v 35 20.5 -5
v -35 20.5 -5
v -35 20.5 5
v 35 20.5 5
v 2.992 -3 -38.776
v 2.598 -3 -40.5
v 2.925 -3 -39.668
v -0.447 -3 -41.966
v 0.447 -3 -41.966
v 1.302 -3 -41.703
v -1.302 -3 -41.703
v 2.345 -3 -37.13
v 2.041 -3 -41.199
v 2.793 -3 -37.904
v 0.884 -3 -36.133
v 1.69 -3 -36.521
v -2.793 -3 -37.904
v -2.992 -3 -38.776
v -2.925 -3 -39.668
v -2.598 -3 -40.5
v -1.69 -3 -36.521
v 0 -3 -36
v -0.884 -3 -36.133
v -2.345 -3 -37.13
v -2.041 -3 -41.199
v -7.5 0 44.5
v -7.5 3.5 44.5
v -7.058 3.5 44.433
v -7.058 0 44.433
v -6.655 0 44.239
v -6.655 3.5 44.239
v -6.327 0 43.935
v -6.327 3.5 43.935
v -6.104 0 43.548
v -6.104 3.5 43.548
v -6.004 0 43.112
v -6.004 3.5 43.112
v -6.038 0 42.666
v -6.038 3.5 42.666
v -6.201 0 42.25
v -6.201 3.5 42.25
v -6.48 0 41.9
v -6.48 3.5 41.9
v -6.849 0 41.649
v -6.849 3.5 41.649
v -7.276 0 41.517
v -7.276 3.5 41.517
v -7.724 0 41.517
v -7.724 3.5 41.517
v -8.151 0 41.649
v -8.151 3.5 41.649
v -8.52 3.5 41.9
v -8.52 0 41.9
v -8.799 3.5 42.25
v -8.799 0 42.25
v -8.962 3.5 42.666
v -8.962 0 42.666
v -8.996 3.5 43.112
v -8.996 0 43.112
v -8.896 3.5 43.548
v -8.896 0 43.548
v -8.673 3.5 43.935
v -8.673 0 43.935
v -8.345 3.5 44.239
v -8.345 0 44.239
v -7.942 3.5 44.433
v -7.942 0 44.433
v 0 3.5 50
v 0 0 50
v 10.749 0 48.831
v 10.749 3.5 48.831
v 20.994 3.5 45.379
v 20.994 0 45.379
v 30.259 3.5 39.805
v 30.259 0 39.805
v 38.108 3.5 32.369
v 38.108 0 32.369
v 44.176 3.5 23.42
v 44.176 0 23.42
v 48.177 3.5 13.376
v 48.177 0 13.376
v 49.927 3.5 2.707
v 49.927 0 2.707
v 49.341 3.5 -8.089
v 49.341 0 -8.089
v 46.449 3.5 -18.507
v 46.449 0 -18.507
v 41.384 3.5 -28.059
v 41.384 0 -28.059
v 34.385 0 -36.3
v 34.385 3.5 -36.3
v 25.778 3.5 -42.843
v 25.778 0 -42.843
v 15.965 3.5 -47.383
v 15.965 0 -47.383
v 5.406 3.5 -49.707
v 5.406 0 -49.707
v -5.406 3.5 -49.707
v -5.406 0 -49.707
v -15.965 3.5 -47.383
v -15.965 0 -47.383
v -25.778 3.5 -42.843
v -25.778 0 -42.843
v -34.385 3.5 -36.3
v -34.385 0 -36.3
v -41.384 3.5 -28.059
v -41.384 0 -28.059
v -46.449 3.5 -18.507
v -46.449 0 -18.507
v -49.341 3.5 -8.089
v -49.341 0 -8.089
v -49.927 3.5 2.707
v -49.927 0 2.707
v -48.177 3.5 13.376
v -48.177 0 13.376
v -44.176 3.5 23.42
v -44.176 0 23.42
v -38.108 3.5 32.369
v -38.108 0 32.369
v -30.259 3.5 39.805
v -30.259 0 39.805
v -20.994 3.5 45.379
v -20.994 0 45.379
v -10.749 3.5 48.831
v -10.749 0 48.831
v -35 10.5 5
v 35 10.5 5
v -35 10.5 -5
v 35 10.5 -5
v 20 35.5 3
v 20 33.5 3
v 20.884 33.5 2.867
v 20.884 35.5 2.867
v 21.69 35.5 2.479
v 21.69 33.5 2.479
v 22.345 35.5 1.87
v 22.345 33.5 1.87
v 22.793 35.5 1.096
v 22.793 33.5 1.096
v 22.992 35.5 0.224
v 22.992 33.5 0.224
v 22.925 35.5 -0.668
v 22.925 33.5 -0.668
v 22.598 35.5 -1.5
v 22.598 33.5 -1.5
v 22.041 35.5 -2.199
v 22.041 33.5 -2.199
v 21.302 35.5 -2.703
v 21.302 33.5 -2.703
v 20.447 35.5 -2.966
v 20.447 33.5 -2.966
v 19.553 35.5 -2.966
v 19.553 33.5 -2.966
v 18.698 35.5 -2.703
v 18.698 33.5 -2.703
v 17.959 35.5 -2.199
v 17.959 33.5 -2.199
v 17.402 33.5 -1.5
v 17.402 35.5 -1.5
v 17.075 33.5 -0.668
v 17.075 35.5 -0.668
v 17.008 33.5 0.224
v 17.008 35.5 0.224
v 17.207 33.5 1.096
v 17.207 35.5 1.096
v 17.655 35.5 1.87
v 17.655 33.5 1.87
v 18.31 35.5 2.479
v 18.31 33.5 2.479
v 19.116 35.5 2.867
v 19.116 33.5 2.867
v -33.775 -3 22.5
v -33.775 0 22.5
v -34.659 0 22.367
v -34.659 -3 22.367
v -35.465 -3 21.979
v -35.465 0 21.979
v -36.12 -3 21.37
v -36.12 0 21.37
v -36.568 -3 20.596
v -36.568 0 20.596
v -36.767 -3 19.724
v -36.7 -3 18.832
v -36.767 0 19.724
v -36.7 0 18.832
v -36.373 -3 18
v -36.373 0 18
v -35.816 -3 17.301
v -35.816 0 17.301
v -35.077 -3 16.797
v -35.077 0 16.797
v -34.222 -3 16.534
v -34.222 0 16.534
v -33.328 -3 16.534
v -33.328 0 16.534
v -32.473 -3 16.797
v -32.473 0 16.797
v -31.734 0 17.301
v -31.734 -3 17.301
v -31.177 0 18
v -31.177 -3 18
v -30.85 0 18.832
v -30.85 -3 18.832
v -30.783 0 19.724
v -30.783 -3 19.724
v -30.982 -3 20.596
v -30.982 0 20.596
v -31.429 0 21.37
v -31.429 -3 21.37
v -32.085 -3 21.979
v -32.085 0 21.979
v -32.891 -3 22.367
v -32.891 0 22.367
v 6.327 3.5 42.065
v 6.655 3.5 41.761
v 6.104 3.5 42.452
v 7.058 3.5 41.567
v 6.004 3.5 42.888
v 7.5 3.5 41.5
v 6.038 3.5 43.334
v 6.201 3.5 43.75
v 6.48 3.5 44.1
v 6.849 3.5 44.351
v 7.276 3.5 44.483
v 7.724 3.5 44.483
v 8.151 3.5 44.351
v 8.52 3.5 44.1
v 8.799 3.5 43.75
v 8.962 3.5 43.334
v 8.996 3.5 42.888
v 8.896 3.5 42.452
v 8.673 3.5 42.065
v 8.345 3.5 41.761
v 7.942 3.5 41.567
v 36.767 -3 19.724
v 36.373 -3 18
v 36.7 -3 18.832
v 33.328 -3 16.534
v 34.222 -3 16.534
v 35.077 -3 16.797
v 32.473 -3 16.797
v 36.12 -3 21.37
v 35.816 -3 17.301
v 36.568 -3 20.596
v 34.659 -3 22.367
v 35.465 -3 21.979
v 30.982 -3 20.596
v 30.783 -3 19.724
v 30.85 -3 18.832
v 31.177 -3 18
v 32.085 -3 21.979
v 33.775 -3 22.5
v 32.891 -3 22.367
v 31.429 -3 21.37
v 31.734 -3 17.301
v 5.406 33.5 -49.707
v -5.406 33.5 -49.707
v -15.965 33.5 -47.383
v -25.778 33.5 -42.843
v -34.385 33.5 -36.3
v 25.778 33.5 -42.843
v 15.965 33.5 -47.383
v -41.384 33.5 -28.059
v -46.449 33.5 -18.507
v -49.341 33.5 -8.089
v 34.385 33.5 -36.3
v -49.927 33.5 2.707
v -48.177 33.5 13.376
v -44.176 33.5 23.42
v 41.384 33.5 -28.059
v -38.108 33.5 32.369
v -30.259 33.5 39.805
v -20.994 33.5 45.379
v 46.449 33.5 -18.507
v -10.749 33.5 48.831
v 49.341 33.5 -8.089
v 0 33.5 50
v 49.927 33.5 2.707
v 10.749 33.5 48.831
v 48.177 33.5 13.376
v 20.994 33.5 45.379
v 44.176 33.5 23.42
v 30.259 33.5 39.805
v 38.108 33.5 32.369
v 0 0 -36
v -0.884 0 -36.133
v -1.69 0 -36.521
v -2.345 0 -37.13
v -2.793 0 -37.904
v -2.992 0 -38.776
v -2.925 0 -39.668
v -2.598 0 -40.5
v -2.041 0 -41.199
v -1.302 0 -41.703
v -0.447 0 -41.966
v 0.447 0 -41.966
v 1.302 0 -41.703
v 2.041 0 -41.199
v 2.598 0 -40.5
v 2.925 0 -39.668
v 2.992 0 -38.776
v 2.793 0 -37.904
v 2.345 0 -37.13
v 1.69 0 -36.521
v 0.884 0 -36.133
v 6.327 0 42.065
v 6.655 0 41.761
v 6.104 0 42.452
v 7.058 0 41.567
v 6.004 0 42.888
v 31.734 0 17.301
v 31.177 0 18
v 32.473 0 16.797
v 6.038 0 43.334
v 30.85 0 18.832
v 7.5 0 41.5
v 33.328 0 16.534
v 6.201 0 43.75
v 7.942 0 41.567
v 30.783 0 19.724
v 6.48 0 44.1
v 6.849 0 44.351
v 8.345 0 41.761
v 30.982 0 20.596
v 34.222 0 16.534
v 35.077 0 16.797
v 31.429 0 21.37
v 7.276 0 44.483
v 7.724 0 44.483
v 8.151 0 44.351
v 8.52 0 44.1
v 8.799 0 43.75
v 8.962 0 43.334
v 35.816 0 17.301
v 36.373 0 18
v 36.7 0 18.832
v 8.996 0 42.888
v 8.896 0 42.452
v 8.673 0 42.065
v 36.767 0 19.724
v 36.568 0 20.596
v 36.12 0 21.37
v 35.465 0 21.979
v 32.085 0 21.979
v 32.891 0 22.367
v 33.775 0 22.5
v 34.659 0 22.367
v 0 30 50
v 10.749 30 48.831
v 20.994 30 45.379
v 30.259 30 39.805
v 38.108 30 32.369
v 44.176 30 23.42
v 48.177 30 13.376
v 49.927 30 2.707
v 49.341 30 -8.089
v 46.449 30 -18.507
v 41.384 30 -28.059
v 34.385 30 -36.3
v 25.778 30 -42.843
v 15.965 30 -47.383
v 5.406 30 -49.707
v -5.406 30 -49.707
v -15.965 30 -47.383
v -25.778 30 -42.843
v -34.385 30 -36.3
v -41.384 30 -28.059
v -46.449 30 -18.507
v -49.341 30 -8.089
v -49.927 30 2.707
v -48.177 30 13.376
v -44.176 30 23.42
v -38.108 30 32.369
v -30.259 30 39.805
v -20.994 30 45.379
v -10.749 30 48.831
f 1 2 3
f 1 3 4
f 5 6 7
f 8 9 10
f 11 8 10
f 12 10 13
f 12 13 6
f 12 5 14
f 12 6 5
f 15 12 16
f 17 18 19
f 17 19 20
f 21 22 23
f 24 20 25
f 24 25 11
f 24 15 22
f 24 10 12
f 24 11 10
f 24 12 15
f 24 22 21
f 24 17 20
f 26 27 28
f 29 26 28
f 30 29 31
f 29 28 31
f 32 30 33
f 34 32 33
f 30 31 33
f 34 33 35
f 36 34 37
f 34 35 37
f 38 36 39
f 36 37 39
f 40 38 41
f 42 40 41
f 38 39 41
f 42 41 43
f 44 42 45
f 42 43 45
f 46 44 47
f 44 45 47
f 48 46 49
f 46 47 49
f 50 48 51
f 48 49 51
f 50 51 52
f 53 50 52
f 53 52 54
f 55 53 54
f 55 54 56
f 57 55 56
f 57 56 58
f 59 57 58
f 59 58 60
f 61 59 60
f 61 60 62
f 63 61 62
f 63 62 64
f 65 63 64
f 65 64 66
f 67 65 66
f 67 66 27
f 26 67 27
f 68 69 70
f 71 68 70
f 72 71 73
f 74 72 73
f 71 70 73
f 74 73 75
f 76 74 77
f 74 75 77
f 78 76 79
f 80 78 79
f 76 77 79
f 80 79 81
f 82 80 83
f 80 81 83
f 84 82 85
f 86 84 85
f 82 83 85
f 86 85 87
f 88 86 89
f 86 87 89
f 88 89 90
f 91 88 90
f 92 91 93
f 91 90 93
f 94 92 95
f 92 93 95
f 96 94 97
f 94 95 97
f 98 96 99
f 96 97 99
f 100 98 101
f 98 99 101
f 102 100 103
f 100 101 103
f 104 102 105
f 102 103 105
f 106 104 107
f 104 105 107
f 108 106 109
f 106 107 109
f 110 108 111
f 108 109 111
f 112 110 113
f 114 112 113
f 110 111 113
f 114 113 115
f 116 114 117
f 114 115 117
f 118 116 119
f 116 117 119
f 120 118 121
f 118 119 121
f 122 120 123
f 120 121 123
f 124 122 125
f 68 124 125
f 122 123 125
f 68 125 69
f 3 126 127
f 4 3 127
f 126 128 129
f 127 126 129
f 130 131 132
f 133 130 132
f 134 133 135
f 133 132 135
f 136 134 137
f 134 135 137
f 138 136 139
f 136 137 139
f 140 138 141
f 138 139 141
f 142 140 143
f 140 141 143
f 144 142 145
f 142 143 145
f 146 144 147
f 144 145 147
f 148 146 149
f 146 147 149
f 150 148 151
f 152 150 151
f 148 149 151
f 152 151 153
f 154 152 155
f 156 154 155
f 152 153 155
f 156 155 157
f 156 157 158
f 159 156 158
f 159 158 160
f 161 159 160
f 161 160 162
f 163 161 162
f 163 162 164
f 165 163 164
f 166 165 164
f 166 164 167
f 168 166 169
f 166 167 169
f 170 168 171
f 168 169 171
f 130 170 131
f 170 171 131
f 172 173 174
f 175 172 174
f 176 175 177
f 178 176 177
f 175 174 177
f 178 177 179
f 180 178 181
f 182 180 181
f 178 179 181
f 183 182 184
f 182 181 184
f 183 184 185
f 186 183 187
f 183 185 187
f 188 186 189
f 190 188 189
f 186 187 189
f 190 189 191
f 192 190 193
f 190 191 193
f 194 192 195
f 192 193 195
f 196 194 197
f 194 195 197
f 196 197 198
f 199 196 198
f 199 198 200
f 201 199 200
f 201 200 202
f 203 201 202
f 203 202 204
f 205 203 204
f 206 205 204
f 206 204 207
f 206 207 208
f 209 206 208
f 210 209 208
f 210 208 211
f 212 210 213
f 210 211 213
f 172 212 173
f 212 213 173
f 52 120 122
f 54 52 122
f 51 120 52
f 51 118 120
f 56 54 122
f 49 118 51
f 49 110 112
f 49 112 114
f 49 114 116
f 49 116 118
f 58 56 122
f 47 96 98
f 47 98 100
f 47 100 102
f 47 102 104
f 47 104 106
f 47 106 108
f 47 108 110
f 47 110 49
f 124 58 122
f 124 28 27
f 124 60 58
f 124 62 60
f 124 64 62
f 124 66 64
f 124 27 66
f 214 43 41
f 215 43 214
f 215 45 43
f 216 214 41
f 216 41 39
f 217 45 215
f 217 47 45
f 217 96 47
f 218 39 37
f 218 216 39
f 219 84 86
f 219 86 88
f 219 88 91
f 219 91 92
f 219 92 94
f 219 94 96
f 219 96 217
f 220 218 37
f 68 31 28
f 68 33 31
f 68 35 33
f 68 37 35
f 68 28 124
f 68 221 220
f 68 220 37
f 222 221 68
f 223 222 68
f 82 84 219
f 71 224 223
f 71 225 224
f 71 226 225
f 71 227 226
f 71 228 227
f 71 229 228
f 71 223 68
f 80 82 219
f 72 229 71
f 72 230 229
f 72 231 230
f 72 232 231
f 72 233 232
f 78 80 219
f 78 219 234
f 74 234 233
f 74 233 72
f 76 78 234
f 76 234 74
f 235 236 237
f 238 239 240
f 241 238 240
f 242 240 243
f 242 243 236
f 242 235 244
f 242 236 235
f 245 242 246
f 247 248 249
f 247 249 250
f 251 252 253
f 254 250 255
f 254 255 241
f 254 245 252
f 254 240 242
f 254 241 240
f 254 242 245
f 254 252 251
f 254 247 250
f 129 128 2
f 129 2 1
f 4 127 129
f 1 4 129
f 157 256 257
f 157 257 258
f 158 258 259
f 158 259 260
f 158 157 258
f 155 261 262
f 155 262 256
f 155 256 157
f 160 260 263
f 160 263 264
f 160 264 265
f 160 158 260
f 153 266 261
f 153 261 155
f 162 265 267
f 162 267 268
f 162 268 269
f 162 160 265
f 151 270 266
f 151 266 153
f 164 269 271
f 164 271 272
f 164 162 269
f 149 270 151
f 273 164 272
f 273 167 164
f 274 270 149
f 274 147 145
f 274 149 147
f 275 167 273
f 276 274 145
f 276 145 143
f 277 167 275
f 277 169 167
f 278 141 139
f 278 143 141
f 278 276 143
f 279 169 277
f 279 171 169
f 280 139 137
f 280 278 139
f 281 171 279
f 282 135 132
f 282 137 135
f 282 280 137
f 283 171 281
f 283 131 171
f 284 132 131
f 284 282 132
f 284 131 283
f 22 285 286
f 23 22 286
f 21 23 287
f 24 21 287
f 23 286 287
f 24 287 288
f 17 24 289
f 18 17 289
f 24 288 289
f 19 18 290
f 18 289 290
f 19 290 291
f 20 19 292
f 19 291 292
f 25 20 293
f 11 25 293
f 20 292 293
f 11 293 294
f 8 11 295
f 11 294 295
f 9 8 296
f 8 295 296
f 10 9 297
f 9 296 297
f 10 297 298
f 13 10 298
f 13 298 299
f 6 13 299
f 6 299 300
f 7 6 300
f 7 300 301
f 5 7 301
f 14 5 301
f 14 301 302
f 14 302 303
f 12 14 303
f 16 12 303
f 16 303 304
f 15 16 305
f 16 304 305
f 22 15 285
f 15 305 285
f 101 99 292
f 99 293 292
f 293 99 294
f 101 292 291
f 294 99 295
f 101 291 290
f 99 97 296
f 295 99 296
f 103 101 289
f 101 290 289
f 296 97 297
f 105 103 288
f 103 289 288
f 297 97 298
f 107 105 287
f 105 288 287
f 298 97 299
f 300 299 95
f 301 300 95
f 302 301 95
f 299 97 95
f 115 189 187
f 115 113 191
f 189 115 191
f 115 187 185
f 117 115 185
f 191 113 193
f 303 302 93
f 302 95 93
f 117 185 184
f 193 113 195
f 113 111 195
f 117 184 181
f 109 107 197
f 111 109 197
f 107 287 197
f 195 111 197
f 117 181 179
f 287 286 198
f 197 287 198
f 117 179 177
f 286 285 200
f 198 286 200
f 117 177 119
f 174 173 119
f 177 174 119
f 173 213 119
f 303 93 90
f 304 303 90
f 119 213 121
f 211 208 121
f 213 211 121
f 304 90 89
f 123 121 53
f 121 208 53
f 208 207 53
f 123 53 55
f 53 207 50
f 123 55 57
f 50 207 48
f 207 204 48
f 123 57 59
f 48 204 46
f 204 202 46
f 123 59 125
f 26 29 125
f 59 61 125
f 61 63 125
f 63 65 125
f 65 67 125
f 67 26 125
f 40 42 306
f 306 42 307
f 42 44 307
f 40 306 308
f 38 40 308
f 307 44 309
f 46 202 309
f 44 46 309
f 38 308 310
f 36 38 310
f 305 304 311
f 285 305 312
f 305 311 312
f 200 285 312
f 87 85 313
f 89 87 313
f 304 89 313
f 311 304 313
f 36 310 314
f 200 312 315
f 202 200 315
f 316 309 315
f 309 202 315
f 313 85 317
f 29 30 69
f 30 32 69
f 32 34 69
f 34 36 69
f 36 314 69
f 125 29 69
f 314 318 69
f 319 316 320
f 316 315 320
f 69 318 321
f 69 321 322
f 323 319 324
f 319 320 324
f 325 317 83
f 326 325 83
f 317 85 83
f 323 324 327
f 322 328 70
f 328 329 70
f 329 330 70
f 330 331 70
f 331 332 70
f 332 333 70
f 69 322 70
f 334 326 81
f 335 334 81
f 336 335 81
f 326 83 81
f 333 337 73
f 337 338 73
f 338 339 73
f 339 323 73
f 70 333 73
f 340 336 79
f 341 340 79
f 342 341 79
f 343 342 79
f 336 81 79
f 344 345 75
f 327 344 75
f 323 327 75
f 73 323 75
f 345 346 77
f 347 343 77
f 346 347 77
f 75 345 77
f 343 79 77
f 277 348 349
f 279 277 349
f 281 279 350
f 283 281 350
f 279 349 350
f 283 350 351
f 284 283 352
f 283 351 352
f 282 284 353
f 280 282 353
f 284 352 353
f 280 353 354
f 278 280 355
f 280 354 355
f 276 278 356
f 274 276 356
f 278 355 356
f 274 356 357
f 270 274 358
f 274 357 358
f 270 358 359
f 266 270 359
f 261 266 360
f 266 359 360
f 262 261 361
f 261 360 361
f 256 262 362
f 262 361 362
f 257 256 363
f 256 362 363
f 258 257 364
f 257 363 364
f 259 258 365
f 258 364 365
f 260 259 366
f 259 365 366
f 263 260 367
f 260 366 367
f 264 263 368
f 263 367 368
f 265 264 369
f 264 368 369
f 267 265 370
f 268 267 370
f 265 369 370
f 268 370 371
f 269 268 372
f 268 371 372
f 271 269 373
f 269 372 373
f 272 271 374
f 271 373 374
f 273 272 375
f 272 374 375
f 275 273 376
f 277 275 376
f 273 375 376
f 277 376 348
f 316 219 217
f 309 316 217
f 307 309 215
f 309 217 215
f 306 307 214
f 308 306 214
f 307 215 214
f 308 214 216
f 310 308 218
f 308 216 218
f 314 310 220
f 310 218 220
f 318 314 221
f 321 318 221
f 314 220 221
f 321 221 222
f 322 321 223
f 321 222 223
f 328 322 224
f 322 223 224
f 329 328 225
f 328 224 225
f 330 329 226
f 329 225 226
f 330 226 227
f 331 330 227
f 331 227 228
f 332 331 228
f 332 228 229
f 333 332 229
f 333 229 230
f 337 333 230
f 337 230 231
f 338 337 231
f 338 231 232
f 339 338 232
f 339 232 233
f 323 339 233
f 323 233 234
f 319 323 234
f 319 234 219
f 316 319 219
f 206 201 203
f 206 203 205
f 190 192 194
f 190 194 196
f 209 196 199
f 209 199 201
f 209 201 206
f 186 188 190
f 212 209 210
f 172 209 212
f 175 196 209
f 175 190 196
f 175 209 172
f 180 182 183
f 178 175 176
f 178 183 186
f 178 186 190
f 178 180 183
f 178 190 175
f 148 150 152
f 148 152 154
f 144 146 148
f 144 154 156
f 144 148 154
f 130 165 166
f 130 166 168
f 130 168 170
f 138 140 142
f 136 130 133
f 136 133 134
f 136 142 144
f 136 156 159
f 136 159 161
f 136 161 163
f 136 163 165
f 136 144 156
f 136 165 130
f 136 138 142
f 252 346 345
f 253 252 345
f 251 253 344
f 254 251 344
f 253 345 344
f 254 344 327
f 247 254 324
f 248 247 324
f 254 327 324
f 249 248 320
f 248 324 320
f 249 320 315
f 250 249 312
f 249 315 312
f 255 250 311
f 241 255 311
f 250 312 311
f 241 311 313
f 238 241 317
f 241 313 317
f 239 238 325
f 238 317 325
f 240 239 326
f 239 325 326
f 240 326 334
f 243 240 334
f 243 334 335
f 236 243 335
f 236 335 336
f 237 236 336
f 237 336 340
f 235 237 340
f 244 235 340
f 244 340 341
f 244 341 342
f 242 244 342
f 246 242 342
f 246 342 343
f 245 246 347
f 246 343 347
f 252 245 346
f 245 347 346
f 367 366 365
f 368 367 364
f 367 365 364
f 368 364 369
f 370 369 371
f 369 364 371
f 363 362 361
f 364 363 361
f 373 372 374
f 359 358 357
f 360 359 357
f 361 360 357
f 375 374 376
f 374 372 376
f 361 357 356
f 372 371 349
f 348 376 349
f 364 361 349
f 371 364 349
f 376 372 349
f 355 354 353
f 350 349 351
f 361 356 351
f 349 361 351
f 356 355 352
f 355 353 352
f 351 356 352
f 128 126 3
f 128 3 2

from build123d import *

# Parameters (mm, degrees)
SKETCH_1_R             = 50
EXTRUDE_1_DEPTH        = 3.5
PATTERN_LINEAR_3_COUNT = 2
PATTERN_LINEAR_3_PITCH = 30
EXTRUDE_START          = 10.5
SKETCH_2_W             = 70
SKETCH_2_H             = 10
EXTRUDE_2_DEPTH        = 10
SKETCH_3_R             = 3
EXTRUDE_3_DEPTH        = 2
SKETCH_5_R             = 1.5
CUT_EXTRUDE_1_DEPTH    = 78.614431648
SKETCH_6_R             = 3
EXTRUDE_4_DEPTH        = 3


with BuildPart() as part:
    # 草图1 → 凸台-拉伸1 (new body)
    with BuildSketch(Plane(origin=(0, 0, 0), x_dir=(1, 0, 0), z_dir=(0, 1, 0))):
        with Locations(Location((0, 0, 0), (0, 0, 270))):
            Circle(SKETCH_1_R)
    extrude(amount=EXTRUDE_1_DEPTH)


with BuildPart() as pattern_linear_3_1:
    # 阵列(线性)3: pattern copy
    add(part.part.moved(Location(Vector(0, 1, 0) * (1 * PATTERN_LINEAR_3_PITCH))))

    # 草图3 → 凸台-拉伸3 (add)
    with BuildSketch(Plane(origin=(0, 33.5, 0), x_dir=(1, 0, 0), z_dir=(0, 1, 0))):
        with Locations(Location((20, 0, 0), (0, 0, 270))):
            Circle(SKETCH_3_R)
    extrude(amount=EXTRUDE_3_DEPTH)


with BuildPart() as body_3:
    # 草图2 → 凸台-拉伸2 (new body)
    with BuildSketch(Plane(origin=(0, 0, 0), x_dir=(1, 0, 0), z_dir=(0, 1, 0)).offset(EXTRUDE_START)):
        Rectangle(SKETCH_2_W, SKETCH_2_H)
    extrude(amount=EXTRUDE_2_DEPTH)


with BuildPart() as part_1:
    add(part.part)

    # 草图5 → 切除-拉伸1 (cut, through all)
    with BuildSketch(Plane(origin=(0, 3.5, 0), x_dir=(1, 0, 0), z_dir=(0, 1, 0))):
        with Locations(Location((-7.5, -43, 0), (0, 0, 270))):
            Circle(SKETCH_5_R)
        with Locations(Location((7.5, -43, 0), (0, 0, 90))):
            Circle(SKETCH_5_R)
    extrude(amount=-CUT_EXTRUDE_1_DEPTH, mode=Mode.SUBTRACT)

    # 草图6 → 凸台-拉伸4 (add)
    with BuildSketch(Plane.XZ):
        with Locations(Location((0, -39, 0), (0, 0, 90))):
            Circle(SKETCH_6_R)
        with Locations(Location((-33.774990748, 19.5, 0), (0, 0, 90))):
            Circle(SKETCH_6_R)
        with Locations(Location((33.774990748, 19.5, 0), (0, 0, 90))):
            Circle(SKETCH_6_R)
    extrude(amount=EXTRUDE_4_DEPTH)


solid = Compound([pattern_linear_3_1.part, body_3.part, part_1.part])
